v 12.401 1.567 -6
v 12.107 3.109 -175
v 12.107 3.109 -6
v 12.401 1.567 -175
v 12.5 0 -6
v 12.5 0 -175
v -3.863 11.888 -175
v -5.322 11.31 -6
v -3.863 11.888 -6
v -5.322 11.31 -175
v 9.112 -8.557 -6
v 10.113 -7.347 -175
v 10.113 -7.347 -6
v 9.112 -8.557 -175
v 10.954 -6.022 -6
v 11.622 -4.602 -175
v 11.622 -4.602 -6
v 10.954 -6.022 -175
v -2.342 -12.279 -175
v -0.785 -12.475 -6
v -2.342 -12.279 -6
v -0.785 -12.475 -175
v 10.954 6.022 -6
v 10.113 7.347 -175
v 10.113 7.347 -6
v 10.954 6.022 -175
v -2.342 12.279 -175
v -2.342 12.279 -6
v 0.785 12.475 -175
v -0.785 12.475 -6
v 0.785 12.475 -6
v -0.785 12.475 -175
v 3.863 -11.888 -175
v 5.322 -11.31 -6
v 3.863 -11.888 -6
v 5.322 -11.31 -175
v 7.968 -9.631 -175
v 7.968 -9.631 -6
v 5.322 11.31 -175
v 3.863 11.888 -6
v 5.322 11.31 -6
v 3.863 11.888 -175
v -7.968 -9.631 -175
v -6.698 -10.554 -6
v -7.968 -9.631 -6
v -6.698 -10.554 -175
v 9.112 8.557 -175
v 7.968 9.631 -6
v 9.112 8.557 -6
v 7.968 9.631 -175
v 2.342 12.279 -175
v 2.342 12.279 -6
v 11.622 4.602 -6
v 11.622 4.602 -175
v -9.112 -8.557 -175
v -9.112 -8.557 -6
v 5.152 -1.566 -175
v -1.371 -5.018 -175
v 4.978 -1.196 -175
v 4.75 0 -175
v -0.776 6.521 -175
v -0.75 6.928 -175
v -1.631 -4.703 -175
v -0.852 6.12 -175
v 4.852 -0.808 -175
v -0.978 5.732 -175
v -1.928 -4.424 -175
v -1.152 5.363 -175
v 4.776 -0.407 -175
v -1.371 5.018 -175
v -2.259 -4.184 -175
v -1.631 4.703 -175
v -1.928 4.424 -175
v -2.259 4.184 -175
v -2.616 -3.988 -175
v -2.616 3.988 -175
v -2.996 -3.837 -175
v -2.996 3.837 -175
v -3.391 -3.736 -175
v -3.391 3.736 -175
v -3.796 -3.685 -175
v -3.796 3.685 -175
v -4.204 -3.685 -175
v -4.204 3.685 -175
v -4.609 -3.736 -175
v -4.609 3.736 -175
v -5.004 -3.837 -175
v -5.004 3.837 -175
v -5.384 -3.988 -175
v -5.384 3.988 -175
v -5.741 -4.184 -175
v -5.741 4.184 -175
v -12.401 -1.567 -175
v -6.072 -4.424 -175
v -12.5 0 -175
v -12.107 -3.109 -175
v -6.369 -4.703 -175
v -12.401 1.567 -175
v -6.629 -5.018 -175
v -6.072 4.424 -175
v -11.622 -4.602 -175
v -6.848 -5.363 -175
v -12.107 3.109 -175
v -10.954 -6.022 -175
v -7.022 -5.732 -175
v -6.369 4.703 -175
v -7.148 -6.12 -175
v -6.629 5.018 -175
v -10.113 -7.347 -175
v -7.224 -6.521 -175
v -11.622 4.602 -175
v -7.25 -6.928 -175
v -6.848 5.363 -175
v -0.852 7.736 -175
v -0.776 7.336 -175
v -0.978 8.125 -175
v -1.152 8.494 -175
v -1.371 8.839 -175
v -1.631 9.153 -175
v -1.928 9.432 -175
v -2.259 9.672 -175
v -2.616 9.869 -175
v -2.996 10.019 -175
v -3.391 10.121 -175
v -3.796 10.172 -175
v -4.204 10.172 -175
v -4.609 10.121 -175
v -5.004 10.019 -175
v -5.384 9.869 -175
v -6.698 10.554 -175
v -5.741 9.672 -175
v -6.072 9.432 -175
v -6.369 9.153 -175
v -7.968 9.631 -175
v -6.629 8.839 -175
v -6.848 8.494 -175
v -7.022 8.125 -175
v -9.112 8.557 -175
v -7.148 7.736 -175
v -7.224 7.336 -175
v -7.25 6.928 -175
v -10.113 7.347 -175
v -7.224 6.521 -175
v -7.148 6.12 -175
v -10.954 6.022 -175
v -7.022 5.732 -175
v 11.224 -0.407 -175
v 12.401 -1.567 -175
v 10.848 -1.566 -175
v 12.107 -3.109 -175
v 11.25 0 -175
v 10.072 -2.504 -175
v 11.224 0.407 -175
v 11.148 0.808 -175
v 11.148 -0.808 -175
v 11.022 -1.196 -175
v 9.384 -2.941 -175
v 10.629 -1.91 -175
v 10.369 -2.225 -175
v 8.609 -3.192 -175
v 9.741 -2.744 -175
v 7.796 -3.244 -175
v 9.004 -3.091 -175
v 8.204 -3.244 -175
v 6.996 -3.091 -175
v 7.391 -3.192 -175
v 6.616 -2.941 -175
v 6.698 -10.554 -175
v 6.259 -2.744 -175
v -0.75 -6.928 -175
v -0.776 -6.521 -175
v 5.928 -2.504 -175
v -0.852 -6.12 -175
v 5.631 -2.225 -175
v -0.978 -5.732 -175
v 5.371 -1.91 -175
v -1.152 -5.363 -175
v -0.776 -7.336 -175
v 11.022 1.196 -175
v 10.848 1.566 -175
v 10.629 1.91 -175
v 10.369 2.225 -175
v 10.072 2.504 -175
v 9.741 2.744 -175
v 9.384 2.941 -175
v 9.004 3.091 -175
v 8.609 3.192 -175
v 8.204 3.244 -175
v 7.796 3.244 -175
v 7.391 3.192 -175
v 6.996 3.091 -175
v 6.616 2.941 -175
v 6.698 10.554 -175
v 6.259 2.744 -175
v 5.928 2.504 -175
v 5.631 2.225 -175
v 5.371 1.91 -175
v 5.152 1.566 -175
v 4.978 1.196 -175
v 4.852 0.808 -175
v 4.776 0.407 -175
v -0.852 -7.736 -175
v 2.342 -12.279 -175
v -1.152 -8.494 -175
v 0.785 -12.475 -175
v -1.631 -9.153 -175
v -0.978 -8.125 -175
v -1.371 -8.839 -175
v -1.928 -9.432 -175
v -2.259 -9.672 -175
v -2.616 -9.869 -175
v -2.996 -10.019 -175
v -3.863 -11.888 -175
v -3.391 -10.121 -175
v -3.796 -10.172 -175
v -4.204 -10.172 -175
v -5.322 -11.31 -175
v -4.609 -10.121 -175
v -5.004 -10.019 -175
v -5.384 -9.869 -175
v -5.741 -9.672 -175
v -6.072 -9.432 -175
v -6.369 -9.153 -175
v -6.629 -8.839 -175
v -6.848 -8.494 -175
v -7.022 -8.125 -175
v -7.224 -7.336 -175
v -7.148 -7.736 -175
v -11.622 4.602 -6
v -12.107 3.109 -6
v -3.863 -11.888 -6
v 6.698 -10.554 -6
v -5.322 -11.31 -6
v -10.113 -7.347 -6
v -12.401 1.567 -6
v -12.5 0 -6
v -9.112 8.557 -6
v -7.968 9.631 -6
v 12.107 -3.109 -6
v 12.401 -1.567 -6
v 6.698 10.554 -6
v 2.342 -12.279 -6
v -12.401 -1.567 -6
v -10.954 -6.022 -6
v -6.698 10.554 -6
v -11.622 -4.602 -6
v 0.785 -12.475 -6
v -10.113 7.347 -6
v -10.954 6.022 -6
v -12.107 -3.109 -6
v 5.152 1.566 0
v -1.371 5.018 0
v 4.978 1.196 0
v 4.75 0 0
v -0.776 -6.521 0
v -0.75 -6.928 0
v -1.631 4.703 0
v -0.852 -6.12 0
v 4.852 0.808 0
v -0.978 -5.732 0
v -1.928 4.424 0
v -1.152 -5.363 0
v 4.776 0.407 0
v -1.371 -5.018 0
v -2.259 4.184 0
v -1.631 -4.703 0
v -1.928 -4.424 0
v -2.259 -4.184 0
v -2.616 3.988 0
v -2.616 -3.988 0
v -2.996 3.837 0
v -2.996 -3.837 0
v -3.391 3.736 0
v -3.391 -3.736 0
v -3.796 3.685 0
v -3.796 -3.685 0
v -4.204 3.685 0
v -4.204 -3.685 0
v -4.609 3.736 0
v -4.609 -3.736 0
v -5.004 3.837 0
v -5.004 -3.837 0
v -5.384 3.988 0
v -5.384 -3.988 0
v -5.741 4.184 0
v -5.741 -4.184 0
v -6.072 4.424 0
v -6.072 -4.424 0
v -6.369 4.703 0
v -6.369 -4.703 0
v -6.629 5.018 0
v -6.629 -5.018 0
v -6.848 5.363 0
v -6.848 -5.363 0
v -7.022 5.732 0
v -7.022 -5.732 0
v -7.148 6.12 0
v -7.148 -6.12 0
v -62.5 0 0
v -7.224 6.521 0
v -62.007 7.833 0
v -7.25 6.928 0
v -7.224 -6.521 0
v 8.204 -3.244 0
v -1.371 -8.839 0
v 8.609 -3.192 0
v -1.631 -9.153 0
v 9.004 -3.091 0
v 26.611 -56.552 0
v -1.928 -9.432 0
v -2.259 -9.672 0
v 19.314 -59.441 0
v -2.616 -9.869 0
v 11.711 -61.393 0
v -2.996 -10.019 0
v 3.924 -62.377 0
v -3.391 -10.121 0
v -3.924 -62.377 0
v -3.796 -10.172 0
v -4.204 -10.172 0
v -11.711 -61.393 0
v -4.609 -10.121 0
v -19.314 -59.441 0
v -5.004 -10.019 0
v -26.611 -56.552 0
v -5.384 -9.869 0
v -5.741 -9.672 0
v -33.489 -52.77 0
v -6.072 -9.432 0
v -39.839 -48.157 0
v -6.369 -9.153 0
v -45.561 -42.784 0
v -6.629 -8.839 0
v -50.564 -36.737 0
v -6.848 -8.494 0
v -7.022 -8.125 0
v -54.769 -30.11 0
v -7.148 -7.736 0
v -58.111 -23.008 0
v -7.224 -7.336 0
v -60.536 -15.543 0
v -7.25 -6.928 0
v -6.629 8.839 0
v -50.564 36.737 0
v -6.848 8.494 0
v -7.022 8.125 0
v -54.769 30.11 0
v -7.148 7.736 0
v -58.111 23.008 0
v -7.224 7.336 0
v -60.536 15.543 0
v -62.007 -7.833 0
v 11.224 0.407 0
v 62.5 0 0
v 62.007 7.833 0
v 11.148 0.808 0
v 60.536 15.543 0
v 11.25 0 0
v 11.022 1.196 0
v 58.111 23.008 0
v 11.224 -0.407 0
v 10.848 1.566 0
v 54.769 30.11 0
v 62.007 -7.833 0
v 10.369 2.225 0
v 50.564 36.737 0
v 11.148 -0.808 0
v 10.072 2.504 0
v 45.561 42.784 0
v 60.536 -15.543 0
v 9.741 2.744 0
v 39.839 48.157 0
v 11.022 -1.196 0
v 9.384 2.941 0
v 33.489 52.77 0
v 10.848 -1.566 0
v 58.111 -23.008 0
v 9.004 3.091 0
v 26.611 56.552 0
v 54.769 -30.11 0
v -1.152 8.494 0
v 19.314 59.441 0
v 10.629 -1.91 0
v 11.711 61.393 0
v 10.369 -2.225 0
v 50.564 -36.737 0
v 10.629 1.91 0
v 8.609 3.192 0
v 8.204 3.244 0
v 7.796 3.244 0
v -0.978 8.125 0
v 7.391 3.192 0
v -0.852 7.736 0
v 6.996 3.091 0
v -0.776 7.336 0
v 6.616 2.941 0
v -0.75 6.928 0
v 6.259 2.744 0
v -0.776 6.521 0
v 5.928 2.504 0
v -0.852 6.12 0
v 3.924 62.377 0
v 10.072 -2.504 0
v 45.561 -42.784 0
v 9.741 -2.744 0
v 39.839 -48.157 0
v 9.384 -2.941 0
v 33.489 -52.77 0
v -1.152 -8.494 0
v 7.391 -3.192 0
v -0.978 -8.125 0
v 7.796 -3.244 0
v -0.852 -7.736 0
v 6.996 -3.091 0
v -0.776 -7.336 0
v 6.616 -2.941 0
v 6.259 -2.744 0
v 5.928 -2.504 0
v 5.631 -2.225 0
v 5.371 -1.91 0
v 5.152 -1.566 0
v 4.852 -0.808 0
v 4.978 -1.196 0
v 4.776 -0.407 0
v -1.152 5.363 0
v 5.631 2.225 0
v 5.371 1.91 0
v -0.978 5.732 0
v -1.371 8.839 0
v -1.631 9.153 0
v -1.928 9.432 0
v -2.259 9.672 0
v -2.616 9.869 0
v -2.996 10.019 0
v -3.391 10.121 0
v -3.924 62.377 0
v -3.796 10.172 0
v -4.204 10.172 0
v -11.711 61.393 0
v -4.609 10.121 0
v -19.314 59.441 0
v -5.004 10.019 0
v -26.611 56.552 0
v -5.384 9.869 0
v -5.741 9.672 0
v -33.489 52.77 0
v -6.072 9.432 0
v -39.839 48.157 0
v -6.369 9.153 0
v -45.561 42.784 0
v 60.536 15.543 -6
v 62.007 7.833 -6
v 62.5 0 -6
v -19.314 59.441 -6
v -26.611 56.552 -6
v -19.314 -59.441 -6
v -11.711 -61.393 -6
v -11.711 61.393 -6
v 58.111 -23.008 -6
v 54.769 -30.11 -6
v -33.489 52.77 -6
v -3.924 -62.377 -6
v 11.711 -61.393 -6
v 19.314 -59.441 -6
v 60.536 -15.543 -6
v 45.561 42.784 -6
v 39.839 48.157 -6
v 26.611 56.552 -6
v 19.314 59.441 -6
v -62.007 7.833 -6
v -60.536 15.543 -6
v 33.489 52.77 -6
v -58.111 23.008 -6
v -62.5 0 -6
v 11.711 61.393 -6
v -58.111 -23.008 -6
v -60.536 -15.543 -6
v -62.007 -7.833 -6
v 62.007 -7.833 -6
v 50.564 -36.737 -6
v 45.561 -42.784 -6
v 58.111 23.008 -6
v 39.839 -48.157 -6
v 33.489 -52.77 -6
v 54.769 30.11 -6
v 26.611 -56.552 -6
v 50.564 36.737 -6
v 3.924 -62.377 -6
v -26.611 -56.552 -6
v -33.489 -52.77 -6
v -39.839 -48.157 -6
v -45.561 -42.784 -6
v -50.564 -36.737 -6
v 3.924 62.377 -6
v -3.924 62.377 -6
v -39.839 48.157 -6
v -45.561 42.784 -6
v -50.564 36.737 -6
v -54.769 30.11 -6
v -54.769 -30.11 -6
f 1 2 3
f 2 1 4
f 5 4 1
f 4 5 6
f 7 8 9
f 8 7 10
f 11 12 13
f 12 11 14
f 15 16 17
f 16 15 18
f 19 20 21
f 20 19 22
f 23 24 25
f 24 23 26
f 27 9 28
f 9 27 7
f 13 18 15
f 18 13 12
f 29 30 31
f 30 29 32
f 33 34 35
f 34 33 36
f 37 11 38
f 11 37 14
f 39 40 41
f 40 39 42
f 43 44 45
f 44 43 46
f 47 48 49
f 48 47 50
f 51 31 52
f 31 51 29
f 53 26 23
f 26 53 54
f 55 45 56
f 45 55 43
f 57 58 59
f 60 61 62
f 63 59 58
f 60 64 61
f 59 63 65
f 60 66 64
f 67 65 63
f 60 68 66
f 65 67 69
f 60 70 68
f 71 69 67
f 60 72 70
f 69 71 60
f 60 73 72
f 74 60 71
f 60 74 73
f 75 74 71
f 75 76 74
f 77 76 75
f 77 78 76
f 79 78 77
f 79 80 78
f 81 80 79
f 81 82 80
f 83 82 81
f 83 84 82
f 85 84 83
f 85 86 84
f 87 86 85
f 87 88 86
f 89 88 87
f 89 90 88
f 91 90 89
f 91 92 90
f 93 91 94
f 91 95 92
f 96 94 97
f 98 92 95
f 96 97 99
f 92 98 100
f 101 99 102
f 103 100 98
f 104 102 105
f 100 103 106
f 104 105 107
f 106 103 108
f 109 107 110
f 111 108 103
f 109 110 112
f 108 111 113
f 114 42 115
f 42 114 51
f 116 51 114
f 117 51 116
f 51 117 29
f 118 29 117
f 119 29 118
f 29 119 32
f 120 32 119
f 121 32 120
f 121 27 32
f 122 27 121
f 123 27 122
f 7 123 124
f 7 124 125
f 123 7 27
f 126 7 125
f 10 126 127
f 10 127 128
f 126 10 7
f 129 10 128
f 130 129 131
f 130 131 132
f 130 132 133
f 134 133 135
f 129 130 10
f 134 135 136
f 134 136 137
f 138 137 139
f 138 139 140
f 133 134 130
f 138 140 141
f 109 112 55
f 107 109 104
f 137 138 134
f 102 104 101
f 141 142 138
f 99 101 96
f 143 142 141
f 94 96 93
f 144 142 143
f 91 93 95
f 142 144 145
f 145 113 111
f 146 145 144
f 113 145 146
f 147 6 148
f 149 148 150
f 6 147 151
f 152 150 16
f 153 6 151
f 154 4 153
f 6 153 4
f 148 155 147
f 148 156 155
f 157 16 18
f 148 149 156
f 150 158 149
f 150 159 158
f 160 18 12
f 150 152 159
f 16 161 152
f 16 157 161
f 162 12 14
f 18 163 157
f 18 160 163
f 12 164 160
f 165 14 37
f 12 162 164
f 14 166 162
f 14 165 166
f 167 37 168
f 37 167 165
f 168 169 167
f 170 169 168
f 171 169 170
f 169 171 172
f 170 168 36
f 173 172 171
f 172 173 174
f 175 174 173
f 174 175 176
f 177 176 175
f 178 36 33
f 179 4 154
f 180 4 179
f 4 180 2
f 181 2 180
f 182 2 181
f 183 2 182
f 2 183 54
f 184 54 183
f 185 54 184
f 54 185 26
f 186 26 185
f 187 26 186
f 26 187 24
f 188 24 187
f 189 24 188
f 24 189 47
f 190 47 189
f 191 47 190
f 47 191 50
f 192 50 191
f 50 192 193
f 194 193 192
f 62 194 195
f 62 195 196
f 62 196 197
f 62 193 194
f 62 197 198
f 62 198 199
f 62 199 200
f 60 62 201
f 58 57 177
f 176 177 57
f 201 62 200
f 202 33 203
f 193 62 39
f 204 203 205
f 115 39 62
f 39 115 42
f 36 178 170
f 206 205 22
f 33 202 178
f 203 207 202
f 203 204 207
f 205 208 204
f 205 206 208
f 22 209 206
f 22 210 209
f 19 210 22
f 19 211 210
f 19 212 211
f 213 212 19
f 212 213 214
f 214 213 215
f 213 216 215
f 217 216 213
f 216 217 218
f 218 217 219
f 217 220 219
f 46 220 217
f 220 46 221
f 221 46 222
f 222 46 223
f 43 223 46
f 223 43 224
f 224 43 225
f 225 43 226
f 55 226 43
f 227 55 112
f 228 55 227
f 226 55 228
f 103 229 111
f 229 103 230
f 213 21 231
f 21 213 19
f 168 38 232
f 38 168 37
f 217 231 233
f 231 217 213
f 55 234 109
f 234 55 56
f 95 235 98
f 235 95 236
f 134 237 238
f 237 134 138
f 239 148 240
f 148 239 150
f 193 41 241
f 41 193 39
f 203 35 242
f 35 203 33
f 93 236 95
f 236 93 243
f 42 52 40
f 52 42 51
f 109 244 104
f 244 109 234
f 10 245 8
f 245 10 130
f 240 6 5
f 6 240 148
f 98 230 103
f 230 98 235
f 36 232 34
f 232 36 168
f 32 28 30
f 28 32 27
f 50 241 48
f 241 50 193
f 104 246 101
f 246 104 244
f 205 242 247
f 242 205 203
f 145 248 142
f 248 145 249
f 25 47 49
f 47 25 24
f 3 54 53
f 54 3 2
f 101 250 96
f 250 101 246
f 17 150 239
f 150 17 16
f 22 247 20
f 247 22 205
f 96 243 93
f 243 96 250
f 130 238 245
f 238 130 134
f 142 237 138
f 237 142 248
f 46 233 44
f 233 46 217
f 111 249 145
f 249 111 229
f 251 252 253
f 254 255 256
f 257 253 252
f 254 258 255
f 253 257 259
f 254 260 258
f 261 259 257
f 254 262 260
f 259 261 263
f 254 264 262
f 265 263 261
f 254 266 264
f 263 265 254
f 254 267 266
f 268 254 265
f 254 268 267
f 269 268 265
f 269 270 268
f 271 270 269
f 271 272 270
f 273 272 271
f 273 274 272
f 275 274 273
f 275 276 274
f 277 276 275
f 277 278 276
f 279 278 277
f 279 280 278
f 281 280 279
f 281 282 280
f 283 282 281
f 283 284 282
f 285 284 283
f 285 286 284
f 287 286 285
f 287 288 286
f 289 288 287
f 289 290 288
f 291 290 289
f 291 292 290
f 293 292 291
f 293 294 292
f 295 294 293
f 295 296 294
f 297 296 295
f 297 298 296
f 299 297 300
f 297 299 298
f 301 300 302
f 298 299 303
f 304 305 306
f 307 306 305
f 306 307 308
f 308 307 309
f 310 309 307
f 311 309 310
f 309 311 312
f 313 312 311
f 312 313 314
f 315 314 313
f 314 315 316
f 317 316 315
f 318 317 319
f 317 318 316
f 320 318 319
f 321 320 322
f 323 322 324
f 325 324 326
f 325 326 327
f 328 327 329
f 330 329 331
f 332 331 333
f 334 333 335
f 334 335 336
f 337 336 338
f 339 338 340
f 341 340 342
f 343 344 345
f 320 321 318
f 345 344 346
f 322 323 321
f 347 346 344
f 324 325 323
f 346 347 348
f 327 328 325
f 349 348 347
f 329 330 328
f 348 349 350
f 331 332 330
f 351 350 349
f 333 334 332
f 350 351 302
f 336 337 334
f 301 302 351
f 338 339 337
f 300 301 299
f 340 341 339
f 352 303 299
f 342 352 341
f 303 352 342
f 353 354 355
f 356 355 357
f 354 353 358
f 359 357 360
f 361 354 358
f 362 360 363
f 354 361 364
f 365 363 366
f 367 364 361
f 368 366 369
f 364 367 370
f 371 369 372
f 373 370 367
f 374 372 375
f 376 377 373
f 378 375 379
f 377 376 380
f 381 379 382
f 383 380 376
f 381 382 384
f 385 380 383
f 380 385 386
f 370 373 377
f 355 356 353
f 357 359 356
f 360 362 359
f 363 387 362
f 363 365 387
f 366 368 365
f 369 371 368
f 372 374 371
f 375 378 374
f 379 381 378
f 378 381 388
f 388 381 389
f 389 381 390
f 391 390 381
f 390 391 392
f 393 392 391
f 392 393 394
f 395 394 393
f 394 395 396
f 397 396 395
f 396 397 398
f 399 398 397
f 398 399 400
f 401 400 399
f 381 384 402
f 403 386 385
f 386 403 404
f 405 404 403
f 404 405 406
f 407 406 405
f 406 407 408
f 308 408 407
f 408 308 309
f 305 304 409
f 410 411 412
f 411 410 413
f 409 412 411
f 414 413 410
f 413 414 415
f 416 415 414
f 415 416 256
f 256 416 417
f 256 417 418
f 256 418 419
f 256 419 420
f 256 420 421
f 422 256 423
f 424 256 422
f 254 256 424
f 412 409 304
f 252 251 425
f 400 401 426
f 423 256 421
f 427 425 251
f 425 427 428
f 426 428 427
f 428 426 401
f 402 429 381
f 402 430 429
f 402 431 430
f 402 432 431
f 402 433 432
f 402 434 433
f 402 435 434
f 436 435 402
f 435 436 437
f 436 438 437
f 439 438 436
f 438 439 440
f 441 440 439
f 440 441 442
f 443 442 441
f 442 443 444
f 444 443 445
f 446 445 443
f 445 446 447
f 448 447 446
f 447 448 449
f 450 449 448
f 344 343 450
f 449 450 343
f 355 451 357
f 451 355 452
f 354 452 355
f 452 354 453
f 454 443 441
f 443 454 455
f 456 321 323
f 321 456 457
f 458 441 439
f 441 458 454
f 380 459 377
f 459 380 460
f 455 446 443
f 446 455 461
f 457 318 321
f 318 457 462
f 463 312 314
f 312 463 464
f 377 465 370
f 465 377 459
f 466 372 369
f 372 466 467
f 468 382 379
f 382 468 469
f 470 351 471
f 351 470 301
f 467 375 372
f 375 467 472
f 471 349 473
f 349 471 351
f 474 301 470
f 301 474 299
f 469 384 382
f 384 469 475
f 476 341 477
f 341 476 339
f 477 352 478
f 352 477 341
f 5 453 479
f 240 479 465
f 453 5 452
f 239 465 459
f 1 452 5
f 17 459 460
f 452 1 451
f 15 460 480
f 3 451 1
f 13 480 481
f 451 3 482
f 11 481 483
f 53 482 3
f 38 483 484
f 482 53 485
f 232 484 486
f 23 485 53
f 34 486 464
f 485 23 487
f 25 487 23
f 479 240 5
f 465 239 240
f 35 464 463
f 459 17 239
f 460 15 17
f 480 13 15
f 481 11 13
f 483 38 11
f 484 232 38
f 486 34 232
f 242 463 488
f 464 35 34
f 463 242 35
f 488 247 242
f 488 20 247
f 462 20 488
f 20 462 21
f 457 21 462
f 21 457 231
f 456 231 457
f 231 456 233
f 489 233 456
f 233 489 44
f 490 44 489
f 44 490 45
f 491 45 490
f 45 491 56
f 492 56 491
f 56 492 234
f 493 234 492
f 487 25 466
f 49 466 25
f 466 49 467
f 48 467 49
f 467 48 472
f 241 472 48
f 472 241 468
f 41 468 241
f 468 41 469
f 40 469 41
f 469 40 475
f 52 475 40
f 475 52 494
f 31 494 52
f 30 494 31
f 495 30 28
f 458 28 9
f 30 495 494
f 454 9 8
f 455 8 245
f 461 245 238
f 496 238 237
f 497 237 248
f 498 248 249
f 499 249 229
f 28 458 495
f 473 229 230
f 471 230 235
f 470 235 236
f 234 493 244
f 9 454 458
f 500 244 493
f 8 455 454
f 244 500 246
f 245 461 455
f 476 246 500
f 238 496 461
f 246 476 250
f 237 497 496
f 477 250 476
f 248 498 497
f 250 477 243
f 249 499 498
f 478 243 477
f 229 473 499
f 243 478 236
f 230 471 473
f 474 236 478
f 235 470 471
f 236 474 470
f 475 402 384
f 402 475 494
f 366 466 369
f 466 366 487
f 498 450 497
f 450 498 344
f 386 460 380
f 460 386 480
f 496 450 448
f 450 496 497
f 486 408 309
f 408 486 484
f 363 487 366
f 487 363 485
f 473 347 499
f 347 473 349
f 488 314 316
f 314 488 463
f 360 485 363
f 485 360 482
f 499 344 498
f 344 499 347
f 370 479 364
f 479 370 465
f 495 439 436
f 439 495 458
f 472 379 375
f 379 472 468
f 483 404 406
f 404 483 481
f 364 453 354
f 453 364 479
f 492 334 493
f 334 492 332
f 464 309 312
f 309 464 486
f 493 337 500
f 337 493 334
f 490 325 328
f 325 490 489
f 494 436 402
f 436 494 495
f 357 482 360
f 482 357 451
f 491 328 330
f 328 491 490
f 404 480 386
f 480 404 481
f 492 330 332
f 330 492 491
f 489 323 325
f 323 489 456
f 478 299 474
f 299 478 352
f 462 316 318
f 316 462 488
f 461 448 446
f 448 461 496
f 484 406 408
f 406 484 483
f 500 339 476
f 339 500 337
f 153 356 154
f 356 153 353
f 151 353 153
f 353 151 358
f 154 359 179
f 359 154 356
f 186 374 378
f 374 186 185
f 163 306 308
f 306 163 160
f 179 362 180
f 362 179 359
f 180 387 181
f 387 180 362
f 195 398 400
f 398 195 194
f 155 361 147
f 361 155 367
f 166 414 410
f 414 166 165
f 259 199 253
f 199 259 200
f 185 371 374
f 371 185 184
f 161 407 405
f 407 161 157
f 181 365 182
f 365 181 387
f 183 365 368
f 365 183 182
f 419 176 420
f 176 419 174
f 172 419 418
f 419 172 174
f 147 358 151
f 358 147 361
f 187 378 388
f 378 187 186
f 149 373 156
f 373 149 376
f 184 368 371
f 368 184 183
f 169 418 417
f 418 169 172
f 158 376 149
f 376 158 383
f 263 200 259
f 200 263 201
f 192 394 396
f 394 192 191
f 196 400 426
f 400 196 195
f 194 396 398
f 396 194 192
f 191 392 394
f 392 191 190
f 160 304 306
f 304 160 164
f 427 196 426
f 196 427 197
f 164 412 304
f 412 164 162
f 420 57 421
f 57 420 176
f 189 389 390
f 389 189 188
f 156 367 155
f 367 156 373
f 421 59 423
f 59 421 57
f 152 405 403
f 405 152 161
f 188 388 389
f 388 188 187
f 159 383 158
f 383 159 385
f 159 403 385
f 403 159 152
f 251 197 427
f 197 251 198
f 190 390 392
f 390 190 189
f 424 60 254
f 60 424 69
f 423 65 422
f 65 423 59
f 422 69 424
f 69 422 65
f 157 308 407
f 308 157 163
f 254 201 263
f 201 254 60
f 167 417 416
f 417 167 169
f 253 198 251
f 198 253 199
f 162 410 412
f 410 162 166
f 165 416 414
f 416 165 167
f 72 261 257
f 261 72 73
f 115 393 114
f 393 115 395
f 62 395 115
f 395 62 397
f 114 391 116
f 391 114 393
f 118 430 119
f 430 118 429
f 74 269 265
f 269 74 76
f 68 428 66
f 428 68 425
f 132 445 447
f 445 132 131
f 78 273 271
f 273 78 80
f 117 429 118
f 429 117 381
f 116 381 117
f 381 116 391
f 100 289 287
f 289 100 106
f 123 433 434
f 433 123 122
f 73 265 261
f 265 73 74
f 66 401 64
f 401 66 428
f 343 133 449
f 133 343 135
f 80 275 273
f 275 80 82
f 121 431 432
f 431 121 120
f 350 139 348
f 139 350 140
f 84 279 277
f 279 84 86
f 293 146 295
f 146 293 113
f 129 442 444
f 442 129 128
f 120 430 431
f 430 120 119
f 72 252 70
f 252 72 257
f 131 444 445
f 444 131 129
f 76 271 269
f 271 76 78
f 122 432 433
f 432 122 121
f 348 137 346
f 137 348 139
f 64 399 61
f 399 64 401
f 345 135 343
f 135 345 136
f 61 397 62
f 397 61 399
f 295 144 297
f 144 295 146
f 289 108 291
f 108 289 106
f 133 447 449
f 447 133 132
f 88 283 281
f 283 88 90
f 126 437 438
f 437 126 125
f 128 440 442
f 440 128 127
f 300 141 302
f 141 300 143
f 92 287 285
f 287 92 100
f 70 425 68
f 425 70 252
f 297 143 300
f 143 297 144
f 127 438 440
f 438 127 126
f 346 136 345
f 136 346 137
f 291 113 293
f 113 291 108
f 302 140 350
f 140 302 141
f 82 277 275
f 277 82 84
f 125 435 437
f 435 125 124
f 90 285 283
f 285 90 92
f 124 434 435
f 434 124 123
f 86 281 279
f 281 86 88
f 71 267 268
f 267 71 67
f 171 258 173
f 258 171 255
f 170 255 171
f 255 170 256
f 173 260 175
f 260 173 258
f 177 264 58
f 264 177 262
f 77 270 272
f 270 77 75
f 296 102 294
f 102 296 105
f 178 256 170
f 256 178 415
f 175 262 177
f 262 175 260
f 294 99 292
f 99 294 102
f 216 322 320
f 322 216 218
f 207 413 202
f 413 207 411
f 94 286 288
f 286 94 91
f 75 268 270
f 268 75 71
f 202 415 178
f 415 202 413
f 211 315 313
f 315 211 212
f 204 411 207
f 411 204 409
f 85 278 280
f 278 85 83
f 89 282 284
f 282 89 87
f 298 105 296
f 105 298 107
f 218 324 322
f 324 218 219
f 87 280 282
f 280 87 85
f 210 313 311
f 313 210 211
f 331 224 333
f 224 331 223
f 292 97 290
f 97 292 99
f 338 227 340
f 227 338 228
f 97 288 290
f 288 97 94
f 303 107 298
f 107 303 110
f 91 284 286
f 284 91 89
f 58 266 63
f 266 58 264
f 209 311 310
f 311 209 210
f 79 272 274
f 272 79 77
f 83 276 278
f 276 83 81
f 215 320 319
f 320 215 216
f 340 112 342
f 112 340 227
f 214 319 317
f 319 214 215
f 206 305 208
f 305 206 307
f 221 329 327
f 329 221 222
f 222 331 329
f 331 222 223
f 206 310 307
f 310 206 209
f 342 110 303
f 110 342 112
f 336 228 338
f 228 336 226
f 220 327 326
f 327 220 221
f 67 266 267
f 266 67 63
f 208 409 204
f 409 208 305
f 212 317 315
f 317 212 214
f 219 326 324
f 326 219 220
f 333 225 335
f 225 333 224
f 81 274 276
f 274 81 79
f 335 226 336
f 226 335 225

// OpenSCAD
$fn = 50;


difference() {
	union() {
		translate(v = [0, 0, -175.0000000000]) {
			cylinder(h = 175, r = 12.5000000000);
		}
		translate(v = [0, 0, -6.0000000000]) {
			cylinder(h = 6, r = 62.5000000000);
		}
	}
	union() {
		#translate(v = [8.0000000000, 0.0000000000, -175]) {
			cylinder(h = 175, r = 3.2500000000);
		}
		#translate(v = [-4.0000000000, 6.9282032303, -175]) {
			cylinder(h = 175, r = 3.2500000000);
		}
		#translate(v = [-4.0000000000, -6.9282032303, -175]) {
			cylinder(h = 175, r = 3.2500000000);
		}
	}
}
